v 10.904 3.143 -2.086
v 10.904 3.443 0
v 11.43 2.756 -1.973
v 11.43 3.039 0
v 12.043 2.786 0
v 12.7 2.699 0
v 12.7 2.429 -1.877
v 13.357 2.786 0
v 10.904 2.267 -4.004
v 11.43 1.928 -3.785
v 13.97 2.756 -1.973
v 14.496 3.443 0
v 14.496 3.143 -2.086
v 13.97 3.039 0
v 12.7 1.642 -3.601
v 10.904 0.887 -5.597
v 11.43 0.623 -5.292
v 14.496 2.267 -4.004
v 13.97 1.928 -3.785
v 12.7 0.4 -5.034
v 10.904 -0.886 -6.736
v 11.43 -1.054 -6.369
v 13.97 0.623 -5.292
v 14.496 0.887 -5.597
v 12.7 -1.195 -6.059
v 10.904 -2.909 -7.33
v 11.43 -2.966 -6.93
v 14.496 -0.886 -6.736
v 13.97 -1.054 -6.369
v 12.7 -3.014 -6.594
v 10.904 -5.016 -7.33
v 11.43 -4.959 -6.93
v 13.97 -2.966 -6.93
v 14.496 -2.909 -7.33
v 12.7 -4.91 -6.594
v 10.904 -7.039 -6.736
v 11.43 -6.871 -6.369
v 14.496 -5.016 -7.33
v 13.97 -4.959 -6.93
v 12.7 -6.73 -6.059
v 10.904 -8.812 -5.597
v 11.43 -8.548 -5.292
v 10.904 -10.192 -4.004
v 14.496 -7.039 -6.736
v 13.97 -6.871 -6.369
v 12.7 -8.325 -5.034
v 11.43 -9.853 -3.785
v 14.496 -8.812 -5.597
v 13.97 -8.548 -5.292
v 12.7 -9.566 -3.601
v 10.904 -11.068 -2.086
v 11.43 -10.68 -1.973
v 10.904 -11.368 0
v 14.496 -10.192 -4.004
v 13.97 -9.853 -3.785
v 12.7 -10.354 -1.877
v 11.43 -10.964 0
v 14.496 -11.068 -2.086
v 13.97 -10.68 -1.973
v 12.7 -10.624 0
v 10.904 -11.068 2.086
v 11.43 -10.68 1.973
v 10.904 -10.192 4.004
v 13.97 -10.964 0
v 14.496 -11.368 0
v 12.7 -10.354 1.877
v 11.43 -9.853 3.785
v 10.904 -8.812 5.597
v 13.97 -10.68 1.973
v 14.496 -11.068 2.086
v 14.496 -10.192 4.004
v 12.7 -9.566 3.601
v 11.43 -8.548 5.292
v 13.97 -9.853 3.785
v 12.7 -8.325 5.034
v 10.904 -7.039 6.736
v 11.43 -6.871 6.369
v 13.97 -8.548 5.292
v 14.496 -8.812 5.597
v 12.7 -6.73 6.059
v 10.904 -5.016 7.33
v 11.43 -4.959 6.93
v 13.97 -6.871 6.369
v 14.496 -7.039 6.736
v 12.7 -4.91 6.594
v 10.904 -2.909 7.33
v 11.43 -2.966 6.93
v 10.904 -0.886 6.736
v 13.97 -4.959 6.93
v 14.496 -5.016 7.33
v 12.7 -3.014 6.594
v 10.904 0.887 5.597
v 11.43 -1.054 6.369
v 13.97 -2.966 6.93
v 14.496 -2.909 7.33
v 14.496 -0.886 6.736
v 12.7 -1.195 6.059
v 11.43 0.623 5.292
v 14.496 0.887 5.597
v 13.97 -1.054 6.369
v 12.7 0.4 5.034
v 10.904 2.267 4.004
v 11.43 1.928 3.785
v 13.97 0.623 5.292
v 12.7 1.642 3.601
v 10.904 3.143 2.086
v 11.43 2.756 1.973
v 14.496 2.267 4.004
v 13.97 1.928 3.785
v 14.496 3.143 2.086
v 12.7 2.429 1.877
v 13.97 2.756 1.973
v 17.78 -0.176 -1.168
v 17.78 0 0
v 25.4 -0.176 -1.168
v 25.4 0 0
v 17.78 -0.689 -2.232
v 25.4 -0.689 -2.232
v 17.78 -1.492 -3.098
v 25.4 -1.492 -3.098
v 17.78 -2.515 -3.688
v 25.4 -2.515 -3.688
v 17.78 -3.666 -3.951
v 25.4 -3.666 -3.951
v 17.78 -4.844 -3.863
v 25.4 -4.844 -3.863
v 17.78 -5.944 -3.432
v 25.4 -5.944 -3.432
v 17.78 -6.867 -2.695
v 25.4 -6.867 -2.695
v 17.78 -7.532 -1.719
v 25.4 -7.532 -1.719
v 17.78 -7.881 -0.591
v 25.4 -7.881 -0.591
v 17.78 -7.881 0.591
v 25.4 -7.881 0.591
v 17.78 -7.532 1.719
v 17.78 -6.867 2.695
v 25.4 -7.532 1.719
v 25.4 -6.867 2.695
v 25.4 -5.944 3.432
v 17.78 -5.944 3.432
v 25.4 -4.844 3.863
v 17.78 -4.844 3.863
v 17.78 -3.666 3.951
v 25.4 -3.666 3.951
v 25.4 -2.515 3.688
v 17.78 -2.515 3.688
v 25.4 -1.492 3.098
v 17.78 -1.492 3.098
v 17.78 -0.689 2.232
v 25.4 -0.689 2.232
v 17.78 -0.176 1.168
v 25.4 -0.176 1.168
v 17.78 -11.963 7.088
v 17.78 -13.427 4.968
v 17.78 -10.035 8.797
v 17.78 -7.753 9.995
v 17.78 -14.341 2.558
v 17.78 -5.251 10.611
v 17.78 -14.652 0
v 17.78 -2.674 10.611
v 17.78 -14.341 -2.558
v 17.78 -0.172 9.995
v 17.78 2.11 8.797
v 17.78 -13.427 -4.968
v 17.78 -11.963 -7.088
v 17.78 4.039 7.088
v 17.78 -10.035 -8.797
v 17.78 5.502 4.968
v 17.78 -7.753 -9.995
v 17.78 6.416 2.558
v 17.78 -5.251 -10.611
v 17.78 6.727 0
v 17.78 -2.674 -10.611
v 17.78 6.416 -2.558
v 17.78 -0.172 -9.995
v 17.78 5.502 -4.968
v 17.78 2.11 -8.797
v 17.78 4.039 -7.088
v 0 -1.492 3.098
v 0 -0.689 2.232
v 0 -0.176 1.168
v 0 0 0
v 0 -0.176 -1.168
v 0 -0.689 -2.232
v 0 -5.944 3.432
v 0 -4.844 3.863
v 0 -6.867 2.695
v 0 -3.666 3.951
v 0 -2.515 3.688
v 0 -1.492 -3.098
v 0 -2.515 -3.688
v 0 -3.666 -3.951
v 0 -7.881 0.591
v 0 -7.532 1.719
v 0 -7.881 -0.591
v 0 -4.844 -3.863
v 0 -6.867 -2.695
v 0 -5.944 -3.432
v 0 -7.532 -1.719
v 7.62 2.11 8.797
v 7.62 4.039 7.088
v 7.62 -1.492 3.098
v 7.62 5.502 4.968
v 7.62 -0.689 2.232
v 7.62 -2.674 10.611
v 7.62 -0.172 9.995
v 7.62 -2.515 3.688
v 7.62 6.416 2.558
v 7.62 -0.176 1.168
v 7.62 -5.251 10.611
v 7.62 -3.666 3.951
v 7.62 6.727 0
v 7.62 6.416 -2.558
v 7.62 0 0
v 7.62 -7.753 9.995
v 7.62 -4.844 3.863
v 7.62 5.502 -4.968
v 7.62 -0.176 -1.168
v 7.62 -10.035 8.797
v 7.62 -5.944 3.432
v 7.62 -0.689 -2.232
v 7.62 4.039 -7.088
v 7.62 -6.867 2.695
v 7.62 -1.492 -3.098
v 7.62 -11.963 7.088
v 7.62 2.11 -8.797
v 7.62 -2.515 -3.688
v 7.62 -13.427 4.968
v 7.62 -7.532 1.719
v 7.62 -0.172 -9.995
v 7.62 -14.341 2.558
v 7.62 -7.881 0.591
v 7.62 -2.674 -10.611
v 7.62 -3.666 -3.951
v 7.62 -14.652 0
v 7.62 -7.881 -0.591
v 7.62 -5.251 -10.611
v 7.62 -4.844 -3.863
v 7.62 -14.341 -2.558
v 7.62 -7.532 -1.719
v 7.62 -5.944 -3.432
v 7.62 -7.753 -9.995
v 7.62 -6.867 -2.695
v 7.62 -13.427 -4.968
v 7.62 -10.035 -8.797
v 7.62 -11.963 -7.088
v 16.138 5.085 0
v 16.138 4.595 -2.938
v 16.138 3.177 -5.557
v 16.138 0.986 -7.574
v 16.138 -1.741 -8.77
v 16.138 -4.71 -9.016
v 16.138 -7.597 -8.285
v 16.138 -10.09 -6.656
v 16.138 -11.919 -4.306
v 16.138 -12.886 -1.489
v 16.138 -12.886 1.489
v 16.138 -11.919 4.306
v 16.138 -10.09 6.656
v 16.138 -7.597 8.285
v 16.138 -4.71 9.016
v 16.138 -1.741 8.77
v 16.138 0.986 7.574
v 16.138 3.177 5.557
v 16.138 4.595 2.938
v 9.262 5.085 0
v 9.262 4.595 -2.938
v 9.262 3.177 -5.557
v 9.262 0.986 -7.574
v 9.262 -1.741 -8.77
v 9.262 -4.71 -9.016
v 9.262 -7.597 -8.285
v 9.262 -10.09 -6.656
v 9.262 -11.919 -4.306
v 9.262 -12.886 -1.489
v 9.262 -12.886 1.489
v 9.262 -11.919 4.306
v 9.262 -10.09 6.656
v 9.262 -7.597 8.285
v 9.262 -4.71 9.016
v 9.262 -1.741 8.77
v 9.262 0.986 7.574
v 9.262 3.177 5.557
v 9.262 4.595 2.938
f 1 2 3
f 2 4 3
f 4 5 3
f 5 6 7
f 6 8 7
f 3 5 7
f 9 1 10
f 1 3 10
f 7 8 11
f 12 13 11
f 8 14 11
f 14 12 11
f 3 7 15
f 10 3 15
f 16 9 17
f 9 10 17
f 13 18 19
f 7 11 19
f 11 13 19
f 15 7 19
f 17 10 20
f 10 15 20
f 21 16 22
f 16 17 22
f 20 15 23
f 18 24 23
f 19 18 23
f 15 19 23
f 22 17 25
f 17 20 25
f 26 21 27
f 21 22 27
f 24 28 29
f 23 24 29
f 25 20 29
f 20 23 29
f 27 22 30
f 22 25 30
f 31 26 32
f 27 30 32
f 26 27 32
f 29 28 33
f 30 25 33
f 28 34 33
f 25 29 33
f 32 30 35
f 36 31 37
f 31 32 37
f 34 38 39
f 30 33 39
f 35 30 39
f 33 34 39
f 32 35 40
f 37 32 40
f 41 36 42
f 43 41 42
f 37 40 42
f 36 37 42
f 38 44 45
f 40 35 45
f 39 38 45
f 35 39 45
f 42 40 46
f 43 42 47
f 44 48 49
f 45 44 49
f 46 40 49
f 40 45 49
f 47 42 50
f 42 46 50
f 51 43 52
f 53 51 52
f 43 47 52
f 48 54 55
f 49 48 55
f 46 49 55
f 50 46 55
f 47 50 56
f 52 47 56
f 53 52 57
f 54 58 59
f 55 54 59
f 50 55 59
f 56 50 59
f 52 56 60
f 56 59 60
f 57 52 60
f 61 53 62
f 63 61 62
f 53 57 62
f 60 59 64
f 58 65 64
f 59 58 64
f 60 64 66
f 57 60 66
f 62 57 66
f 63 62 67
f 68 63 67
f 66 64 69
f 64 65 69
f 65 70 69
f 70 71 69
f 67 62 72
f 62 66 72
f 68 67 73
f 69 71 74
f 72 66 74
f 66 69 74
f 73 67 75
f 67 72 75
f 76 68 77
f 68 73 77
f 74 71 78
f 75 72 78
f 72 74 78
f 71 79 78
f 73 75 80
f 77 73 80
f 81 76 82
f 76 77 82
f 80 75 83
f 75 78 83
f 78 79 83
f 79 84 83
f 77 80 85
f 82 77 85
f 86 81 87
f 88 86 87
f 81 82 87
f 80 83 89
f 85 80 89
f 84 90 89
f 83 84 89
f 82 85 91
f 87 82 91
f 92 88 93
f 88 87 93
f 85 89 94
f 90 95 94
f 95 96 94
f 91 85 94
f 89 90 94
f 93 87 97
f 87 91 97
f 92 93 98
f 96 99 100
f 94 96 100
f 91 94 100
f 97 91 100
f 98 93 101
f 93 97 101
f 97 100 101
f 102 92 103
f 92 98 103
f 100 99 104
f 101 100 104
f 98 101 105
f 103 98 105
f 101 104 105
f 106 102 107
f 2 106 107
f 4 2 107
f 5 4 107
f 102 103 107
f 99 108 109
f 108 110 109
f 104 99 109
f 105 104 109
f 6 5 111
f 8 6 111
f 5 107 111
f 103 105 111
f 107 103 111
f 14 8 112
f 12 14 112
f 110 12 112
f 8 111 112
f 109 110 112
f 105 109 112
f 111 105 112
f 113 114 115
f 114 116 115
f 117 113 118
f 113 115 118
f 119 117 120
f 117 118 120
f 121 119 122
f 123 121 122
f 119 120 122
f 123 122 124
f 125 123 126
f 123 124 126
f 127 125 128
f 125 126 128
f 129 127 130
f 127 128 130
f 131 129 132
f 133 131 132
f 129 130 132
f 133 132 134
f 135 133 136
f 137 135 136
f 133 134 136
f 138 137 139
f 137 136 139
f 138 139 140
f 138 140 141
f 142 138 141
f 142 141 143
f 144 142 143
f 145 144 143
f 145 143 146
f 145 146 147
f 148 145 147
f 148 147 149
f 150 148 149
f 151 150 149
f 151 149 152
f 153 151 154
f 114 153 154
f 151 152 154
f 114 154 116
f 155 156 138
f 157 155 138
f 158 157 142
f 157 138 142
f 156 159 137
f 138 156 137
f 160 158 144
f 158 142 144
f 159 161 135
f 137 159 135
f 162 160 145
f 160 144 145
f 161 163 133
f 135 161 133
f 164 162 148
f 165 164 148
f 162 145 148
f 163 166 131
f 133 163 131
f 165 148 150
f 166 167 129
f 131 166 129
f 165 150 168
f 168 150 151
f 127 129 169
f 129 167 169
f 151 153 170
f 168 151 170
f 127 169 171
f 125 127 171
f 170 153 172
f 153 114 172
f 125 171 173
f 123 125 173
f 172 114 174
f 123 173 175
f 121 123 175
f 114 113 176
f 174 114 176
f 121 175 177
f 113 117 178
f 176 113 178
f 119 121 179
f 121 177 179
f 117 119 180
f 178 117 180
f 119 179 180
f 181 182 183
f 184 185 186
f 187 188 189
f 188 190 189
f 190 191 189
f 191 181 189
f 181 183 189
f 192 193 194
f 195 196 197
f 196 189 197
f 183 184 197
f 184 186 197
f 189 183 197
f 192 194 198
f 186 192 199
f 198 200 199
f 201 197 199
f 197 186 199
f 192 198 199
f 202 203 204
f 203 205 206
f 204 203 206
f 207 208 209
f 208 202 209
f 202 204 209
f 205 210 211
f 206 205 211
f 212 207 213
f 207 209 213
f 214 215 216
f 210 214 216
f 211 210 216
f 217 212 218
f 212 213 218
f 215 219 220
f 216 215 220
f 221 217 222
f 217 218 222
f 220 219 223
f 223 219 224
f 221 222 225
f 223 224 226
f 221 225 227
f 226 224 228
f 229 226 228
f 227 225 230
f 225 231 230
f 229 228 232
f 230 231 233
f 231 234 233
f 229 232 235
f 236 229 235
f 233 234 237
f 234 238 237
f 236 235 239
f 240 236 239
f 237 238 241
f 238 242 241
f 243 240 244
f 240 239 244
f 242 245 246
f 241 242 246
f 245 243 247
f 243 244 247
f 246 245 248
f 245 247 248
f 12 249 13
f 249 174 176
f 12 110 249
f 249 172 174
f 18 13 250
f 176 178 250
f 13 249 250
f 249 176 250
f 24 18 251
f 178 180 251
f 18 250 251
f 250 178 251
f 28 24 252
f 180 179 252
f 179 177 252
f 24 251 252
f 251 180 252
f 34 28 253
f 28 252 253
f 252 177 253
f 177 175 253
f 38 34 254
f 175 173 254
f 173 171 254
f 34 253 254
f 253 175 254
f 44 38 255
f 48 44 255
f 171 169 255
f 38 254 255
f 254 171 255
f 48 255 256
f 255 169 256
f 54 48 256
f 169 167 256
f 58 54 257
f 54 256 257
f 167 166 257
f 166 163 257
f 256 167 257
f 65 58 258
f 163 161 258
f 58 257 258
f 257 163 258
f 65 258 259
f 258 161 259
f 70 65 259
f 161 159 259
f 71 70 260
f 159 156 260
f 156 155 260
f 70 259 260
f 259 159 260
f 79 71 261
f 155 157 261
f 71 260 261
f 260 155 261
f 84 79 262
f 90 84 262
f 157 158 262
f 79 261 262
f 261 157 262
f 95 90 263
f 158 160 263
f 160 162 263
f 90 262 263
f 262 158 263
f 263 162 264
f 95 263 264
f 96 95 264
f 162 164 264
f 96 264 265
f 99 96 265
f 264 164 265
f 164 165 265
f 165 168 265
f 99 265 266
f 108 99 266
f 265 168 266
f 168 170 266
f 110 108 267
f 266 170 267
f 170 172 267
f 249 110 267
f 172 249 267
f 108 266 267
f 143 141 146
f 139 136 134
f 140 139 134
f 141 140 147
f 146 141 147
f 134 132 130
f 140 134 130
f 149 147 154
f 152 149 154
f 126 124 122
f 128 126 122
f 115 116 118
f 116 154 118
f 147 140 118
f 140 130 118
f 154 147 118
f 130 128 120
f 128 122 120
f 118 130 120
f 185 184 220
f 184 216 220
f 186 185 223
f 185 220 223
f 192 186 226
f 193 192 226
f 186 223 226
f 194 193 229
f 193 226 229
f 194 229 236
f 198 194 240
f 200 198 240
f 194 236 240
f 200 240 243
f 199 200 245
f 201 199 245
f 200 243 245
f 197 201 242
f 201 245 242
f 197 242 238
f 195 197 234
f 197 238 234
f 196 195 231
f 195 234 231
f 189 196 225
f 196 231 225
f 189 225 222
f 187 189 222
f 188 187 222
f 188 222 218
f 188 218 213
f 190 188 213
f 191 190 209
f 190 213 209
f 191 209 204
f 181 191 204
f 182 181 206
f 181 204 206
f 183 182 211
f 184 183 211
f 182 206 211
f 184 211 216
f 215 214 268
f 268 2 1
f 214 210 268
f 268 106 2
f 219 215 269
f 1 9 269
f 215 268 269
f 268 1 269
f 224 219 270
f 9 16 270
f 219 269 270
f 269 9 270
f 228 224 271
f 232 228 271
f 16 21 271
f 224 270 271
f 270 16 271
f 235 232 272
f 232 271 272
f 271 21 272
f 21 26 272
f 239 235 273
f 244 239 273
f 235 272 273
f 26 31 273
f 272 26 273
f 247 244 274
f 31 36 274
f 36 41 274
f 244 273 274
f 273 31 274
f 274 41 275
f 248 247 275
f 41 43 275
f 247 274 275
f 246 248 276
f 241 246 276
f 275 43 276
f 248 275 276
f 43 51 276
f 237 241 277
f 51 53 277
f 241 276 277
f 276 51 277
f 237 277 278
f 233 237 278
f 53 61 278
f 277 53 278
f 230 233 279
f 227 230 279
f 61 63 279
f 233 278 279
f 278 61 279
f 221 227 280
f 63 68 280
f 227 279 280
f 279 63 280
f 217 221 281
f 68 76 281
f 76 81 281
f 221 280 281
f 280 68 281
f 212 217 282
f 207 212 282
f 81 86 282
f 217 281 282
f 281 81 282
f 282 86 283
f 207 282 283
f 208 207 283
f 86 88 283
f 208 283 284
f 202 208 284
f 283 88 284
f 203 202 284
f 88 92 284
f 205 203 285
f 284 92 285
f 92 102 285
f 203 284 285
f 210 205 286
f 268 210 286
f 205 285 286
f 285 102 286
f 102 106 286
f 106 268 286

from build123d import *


with BuildPart() as part:
    # Sketch1 → Revolve1 (revolve)
    with BuildSketch(Plane.XY):
        with BuildLine():
            Line((0, 0), (7.62, 0))
            Line((7.62, 0), (7.62, 6.726876964))
            Line((7.62, 6.726876964), (10.903948776, 3.442928188))
            ThreePointArc((10.903948776, 3.442928188), (12.7, 2.698979412), (14.496051224, 3.442928188))
            Line((14.496051224, 3.442928188), (17.78, 6.726876964))
            Line((17.78, 6.726876964), (17.78, 0))
            Line((17.78, 0), (25.4, 0))
            Line((25.4, 0), (25.4, -3.9624))
            Line((25.4, -3.9624), (0, -3.9624))
            Line((0, -3.9624), (0, 0))
        make_face()
    revolve(axis=Axis((25.4, -3.9624, 0), (-1, 0, 0)))


solid = part.part
